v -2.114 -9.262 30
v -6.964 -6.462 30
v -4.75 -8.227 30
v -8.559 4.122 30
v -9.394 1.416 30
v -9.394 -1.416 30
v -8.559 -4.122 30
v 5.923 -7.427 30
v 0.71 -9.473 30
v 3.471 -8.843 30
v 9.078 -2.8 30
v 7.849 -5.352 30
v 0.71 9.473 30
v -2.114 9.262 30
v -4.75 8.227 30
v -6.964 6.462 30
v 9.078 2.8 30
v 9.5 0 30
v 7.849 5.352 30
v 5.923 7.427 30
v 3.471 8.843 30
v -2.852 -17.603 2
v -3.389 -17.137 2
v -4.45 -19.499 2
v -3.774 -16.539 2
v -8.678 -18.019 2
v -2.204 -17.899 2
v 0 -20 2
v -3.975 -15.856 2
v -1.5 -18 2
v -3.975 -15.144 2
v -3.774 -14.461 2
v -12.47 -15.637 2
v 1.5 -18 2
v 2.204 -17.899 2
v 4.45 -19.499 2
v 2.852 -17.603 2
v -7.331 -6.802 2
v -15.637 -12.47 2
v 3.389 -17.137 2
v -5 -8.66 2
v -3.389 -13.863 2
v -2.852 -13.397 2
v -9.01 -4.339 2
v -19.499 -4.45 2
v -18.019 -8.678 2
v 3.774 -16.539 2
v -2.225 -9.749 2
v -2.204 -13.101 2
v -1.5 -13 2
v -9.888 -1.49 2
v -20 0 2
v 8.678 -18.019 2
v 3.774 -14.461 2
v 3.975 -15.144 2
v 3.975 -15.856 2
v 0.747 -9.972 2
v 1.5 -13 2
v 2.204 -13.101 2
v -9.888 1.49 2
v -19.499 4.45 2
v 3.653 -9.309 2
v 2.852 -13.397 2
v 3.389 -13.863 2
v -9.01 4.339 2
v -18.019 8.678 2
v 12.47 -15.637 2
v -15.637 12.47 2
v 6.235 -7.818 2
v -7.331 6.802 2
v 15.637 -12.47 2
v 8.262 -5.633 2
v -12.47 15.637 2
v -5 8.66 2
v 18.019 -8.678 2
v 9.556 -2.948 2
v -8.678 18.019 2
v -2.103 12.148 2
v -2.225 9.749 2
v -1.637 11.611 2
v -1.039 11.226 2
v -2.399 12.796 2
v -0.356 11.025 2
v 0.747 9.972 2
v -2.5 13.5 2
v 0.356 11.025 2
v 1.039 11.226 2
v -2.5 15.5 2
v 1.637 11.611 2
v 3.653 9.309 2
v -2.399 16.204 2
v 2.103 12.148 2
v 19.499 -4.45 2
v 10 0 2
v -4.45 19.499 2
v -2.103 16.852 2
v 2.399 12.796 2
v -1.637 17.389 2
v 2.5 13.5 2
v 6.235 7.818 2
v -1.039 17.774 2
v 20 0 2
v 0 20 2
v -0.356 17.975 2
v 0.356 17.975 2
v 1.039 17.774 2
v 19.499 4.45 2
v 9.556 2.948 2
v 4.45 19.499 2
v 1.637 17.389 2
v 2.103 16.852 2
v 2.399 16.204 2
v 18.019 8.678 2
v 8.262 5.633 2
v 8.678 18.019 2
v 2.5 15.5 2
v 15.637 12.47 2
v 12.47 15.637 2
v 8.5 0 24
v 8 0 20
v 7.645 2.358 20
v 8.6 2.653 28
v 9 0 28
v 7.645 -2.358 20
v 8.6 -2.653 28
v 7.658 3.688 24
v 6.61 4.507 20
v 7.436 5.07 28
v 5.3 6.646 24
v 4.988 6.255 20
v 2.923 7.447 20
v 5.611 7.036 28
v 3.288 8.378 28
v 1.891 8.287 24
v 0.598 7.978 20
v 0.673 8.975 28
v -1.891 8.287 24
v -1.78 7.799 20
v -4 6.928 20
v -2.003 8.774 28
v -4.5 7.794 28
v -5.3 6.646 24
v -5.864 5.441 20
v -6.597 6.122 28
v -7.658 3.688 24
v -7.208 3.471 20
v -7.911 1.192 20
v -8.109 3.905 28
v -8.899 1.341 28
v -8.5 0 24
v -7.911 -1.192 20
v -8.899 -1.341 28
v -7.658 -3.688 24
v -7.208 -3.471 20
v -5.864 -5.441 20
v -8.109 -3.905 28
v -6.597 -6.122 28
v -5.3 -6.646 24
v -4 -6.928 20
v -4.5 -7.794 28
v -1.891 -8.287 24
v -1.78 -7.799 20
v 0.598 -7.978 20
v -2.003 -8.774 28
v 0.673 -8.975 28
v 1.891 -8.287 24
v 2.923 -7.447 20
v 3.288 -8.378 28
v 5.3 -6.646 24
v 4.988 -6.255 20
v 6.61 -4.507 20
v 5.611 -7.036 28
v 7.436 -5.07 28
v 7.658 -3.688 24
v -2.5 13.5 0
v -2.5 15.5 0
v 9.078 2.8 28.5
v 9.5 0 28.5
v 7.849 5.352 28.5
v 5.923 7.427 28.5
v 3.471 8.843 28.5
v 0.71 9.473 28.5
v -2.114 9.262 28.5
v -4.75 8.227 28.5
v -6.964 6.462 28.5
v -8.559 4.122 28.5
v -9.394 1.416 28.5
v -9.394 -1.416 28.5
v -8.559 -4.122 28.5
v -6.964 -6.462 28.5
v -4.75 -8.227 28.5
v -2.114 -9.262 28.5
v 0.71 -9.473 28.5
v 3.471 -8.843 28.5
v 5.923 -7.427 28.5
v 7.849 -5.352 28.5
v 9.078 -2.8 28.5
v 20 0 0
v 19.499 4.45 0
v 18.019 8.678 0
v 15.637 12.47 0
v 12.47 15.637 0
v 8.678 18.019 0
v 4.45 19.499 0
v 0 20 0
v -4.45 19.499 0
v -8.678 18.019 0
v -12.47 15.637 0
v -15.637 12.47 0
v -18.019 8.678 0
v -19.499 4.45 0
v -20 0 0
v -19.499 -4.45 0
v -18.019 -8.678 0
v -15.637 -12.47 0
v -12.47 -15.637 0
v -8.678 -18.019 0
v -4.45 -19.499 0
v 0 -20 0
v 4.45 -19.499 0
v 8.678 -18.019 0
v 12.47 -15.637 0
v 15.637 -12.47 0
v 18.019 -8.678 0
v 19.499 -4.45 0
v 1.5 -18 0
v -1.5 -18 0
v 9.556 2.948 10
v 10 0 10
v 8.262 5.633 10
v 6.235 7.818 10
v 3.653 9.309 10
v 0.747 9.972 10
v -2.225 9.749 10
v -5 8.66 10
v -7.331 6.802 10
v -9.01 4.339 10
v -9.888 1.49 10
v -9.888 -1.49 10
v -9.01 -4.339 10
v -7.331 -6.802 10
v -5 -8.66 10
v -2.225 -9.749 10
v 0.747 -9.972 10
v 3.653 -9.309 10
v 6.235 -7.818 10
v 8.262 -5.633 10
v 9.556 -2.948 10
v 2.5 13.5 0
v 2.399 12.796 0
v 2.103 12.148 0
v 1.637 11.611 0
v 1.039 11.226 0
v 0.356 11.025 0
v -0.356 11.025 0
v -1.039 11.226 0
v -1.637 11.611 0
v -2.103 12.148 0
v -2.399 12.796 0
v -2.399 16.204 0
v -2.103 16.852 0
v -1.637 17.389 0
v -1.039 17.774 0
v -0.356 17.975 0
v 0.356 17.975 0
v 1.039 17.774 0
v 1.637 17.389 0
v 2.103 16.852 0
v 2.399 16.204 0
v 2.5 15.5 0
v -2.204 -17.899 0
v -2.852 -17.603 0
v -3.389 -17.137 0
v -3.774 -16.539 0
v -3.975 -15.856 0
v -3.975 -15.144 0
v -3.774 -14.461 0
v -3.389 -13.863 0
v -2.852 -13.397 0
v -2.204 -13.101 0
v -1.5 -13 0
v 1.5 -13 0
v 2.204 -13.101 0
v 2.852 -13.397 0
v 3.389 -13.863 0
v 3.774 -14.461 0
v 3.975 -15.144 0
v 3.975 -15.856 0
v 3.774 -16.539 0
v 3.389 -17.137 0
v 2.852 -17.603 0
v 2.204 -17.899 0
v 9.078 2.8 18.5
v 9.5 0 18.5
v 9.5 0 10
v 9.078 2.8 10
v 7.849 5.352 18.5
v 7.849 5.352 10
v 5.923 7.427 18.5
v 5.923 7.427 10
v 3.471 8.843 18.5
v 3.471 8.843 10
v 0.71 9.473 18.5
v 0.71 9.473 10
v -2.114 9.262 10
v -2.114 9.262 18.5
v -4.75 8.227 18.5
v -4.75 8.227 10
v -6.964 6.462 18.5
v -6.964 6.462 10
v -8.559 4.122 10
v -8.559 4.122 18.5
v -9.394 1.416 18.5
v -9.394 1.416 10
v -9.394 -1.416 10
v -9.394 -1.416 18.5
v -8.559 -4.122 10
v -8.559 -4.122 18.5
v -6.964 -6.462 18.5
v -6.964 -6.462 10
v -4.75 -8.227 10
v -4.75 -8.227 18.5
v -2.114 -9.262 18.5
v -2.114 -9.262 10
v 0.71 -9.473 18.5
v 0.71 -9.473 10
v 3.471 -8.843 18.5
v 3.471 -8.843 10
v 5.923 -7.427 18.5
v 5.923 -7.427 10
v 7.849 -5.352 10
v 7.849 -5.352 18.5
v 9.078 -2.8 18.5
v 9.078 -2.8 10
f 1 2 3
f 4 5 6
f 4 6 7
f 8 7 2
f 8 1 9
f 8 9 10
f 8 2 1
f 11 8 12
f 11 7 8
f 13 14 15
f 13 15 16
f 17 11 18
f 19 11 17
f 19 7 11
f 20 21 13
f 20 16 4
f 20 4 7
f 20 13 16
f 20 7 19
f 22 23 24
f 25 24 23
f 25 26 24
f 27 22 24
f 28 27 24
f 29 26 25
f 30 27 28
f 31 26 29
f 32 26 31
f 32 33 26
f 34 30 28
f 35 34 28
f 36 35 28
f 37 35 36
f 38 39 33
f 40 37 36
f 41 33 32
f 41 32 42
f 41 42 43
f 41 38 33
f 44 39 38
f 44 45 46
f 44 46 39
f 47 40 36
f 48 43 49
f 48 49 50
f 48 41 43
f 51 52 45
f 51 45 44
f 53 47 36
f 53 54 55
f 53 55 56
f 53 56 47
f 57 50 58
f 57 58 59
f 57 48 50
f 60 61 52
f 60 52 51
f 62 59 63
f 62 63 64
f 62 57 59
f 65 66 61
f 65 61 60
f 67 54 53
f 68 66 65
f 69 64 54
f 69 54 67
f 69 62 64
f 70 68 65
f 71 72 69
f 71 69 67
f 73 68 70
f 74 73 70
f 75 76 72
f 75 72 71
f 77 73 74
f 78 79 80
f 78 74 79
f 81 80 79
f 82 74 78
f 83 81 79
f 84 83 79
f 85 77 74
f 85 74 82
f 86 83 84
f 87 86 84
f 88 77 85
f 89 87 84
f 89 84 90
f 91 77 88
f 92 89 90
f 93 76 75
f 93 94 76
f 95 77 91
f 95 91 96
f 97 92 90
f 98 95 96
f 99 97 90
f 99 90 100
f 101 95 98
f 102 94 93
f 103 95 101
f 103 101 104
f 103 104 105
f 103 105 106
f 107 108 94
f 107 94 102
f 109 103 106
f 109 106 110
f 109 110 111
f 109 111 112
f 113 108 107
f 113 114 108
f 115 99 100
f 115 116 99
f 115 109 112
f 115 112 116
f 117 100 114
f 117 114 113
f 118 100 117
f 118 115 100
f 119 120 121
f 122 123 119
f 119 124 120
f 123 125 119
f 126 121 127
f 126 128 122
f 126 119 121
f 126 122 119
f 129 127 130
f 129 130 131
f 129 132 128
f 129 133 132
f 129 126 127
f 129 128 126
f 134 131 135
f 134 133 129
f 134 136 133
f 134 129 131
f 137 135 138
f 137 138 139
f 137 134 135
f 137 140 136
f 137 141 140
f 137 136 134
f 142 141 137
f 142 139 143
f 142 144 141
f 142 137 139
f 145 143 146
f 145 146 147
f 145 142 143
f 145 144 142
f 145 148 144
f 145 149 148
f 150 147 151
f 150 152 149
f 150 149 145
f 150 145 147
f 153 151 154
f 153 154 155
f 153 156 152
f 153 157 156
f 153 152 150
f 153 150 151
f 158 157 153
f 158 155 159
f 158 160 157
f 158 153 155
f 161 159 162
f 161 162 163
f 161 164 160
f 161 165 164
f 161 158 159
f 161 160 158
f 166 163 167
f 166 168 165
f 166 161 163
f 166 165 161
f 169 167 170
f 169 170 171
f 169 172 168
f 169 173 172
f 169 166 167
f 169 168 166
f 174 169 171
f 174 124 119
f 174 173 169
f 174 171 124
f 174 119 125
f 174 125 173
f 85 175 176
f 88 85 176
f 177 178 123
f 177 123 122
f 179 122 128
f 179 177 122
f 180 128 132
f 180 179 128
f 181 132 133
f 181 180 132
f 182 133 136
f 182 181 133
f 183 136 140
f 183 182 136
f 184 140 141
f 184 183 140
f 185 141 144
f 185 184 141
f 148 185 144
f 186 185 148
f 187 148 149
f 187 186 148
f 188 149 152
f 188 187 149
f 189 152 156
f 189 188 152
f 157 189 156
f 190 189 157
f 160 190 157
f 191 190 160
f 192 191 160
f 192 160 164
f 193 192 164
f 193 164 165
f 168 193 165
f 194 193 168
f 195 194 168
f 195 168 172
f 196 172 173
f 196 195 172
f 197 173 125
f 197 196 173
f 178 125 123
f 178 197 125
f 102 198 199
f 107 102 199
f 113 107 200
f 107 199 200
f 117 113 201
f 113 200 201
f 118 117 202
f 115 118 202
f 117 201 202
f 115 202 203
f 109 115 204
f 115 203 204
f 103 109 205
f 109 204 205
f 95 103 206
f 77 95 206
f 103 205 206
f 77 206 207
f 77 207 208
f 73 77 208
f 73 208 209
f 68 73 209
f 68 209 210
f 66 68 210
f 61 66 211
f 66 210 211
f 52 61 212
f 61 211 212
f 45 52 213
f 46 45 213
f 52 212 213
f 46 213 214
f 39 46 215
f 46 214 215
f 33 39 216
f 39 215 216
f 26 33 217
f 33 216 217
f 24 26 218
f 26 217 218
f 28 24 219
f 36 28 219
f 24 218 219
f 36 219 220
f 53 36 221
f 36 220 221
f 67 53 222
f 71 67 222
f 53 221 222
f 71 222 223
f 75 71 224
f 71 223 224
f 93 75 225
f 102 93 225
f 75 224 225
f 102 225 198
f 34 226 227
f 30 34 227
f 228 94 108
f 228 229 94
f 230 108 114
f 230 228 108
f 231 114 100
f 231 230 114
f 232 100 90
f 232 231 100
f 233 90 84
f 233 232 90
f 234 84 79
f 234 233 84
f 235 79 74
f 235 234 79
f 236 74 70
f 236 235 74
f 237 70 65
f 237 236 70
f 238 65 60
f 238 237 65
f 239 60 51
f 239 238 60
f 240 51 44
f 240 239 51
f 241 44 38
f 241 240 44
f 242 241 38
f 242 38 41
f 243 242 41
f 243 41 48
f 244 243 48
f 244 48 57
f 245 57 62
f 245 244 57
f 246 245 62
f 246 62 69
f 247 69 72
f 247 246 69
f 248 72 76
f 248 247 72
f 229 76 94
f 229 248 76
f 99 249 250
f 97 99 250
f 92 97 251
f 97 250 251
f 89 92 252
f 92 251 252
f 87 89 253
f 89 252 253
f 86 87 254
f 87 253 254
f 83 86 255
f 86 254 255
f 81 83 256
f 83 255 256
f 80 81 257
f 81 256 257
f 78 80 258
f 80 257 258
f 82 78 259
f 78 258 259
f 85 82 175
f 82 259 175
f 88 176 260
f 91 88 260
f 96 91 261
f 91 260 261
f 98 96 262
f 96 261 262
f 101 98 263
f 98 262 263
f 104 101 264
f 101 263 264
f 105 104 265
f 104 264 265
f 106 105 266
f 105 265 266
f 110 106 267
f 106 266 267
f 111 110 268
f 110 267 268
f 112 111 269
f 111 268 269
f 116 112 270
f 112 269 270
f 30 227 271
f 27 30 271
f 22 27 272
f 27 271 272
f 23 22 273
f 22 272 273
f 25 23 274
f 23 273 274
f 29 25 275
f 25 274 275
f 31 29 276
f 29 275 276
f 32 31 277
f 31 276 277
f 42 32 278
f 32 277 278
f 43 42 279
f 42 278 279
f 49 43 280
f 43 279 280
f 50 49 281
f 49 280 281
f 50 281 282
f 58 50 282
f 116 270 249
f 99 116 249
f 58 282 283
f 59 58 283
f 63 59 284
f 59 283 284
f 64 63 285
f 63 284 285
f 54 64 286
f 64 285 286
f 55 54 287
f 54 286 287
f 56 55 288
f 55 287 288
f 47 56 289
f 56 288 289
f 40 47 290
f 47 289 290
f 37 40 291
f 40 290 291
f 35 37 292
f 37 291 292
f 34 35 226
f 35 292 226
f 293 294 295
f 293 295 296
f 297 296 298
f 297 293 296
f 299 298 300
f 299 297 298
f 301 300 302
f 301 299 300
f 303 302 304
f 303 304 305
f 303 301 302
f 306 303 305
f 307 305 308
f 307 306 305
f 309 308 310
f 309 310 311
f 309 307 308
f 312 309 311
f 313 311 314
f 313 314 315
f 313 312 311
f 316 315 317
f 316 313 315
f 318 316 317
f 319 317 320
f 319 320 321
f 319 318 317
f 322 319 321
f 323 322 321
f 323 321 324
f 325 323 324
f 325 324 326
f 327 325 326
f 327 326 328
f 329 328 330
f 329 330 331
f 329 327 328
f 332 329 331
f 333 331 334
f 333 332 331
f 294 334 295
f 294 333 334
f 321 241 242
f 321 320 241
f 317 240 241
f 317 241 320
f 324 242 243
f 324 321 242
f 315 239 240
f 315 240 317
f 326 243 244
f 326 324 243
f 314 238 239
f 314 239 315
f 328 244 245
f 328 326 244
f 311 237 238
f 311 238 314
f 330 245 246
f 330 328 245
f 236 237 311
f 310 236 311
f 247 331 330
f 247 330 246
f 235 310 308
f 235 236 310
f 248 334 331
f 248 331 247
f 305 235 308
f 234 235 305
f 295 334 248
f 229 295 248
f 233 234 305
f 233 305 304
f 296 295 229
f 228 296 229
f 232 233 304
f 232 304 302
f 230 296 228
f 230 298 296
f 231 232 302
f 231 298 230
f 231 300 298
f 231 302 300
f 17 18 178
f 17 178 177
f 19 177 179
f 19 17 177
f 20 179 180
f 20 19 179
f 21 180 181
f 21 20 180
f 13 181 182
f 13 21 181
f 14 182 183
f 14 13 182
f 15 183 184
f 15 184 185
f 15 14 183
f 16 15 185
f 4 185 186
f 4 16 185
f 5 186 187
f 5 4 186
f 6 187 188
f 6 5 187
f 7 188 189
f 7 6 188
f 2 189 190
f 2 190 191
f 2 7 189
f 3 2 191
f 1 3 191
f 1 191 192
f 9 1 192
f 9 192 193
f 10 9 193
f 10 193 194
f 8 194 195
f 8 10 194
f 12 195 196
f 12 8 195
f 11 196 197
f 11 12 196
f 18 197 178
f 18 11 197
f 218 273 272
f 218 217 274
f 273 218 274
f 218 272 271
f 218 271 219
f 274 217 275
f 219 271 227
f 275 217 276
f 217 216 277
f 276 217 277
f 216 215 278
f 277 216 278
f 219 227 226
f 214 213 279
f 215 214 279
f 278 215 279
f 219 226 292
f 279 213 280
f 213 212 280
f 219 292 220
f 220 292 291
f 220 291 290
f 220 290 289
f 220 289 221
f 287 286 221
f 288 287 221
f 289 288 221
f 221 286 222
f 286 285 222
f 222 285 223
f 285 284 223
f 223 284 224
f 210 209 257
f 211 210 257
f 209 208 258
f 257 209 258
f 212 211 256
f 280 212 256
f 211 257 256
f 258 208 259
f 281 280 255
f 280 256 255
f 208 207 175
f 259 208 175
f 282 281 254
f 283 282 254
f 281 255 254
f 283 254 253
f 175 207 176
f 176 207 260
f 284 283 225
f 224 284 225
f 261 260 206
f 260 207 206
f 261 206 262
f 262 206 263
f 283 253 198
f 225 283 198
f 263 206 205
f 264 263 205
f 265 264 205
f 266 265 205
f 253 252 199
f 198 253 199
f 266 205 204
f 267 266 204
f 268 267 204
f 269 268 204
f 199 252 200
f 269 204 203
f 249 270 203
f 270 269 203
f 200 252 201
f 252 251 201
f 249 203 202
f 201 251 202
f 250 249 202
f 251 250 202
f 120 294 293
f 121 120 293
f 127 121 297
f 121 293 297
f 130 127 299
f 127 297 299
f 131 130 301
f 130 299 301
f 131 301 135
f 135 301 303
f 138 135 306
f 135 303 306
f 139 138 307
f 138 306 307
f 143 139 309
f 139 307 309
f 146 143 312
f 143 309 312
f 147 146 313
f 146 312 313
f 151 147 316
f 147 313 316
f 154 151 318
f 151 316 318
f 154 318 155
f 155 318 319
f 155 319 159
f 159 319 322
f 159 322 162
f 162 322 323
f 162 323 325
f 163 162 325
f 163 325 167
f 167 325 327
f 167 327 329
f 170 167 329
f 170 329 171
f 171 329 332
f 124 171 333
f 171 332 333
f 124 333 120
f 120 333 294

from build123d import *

# Parameters (mm, degrees)
F0_R     = 20
F1_DEPTH = 2
F4_SIZE  = 0.49999
F5_SIZE  = 1.49999


# Not quite as in the source:
# - a fillet or chamfer is up to 0.001 mm smaller than in the source, because OpenCascade refuses the exact size


with BuildPart() as f1:
    # F0 (on Top) → F1 (new body)
    with BuildSketch(Plane.XY):
        Circle(F0_R)
        with BuildLine():
            Line((-1.5, -13), (1.5, -13))
            ThreePointArc((1.5, -13), (4, -15.5), (1.5, -18))
            Line((1.5, -18), (-1.5, -18))
            ThreePointArc((-1.5, -18), (-4, -15.5), (-1.5, -13))
        make_face(mode=Mode.SUBTRACT)
        with BuildLine():
            ThreePointArc((2.5, 13.5), (0, 11), (-2.5, 13.5))
            Line((-2.5, 13.5), (-2.5, 15.5))
            ThreePointArc((-2.5, 15.5), (0, 18), (2.5, 15.5))
            Line((2.5, 15.5), (2.5, 13.5))
        make_face(mode=Mode.SUBTRACT)
    extrude(amount=F1_DEPTH)

    # F2 (on Front) → F3 (revolve)
    with BuildSketch(Plane.XZ):
        Polygon((0, 30), (0, 2), (10, 2), (10, 10), (9.5, 10), (9.5, 20), (8, 20), (9, 28), (9.5, 28), (9.5, 30), align=None)
    revolve(axis=Axis((0, 0, 44.0067852139), (0, 0, 1)))

    # F4 (size 0.5 in the source; OpenCascade refuses exactly that, so slightly less here)
    f4_edges = [f1.edges().sort_by_distance(p)[0] for p in [
        (-9.5, 0, 28),
    ]]
    chamfer(f4_edges, length=F4_SIZE)

    # F5 (size 1.5 in the source; OpenCascade refuses exactly that, so slightly less here)
    f5_edges = [f1.edges().sort_by_distance(p)[0] for p in [
        (-9.5, 0, 20),
    ]]
    chamfer(f5_edges, length=F5_SIZE)


solid = f1.part
